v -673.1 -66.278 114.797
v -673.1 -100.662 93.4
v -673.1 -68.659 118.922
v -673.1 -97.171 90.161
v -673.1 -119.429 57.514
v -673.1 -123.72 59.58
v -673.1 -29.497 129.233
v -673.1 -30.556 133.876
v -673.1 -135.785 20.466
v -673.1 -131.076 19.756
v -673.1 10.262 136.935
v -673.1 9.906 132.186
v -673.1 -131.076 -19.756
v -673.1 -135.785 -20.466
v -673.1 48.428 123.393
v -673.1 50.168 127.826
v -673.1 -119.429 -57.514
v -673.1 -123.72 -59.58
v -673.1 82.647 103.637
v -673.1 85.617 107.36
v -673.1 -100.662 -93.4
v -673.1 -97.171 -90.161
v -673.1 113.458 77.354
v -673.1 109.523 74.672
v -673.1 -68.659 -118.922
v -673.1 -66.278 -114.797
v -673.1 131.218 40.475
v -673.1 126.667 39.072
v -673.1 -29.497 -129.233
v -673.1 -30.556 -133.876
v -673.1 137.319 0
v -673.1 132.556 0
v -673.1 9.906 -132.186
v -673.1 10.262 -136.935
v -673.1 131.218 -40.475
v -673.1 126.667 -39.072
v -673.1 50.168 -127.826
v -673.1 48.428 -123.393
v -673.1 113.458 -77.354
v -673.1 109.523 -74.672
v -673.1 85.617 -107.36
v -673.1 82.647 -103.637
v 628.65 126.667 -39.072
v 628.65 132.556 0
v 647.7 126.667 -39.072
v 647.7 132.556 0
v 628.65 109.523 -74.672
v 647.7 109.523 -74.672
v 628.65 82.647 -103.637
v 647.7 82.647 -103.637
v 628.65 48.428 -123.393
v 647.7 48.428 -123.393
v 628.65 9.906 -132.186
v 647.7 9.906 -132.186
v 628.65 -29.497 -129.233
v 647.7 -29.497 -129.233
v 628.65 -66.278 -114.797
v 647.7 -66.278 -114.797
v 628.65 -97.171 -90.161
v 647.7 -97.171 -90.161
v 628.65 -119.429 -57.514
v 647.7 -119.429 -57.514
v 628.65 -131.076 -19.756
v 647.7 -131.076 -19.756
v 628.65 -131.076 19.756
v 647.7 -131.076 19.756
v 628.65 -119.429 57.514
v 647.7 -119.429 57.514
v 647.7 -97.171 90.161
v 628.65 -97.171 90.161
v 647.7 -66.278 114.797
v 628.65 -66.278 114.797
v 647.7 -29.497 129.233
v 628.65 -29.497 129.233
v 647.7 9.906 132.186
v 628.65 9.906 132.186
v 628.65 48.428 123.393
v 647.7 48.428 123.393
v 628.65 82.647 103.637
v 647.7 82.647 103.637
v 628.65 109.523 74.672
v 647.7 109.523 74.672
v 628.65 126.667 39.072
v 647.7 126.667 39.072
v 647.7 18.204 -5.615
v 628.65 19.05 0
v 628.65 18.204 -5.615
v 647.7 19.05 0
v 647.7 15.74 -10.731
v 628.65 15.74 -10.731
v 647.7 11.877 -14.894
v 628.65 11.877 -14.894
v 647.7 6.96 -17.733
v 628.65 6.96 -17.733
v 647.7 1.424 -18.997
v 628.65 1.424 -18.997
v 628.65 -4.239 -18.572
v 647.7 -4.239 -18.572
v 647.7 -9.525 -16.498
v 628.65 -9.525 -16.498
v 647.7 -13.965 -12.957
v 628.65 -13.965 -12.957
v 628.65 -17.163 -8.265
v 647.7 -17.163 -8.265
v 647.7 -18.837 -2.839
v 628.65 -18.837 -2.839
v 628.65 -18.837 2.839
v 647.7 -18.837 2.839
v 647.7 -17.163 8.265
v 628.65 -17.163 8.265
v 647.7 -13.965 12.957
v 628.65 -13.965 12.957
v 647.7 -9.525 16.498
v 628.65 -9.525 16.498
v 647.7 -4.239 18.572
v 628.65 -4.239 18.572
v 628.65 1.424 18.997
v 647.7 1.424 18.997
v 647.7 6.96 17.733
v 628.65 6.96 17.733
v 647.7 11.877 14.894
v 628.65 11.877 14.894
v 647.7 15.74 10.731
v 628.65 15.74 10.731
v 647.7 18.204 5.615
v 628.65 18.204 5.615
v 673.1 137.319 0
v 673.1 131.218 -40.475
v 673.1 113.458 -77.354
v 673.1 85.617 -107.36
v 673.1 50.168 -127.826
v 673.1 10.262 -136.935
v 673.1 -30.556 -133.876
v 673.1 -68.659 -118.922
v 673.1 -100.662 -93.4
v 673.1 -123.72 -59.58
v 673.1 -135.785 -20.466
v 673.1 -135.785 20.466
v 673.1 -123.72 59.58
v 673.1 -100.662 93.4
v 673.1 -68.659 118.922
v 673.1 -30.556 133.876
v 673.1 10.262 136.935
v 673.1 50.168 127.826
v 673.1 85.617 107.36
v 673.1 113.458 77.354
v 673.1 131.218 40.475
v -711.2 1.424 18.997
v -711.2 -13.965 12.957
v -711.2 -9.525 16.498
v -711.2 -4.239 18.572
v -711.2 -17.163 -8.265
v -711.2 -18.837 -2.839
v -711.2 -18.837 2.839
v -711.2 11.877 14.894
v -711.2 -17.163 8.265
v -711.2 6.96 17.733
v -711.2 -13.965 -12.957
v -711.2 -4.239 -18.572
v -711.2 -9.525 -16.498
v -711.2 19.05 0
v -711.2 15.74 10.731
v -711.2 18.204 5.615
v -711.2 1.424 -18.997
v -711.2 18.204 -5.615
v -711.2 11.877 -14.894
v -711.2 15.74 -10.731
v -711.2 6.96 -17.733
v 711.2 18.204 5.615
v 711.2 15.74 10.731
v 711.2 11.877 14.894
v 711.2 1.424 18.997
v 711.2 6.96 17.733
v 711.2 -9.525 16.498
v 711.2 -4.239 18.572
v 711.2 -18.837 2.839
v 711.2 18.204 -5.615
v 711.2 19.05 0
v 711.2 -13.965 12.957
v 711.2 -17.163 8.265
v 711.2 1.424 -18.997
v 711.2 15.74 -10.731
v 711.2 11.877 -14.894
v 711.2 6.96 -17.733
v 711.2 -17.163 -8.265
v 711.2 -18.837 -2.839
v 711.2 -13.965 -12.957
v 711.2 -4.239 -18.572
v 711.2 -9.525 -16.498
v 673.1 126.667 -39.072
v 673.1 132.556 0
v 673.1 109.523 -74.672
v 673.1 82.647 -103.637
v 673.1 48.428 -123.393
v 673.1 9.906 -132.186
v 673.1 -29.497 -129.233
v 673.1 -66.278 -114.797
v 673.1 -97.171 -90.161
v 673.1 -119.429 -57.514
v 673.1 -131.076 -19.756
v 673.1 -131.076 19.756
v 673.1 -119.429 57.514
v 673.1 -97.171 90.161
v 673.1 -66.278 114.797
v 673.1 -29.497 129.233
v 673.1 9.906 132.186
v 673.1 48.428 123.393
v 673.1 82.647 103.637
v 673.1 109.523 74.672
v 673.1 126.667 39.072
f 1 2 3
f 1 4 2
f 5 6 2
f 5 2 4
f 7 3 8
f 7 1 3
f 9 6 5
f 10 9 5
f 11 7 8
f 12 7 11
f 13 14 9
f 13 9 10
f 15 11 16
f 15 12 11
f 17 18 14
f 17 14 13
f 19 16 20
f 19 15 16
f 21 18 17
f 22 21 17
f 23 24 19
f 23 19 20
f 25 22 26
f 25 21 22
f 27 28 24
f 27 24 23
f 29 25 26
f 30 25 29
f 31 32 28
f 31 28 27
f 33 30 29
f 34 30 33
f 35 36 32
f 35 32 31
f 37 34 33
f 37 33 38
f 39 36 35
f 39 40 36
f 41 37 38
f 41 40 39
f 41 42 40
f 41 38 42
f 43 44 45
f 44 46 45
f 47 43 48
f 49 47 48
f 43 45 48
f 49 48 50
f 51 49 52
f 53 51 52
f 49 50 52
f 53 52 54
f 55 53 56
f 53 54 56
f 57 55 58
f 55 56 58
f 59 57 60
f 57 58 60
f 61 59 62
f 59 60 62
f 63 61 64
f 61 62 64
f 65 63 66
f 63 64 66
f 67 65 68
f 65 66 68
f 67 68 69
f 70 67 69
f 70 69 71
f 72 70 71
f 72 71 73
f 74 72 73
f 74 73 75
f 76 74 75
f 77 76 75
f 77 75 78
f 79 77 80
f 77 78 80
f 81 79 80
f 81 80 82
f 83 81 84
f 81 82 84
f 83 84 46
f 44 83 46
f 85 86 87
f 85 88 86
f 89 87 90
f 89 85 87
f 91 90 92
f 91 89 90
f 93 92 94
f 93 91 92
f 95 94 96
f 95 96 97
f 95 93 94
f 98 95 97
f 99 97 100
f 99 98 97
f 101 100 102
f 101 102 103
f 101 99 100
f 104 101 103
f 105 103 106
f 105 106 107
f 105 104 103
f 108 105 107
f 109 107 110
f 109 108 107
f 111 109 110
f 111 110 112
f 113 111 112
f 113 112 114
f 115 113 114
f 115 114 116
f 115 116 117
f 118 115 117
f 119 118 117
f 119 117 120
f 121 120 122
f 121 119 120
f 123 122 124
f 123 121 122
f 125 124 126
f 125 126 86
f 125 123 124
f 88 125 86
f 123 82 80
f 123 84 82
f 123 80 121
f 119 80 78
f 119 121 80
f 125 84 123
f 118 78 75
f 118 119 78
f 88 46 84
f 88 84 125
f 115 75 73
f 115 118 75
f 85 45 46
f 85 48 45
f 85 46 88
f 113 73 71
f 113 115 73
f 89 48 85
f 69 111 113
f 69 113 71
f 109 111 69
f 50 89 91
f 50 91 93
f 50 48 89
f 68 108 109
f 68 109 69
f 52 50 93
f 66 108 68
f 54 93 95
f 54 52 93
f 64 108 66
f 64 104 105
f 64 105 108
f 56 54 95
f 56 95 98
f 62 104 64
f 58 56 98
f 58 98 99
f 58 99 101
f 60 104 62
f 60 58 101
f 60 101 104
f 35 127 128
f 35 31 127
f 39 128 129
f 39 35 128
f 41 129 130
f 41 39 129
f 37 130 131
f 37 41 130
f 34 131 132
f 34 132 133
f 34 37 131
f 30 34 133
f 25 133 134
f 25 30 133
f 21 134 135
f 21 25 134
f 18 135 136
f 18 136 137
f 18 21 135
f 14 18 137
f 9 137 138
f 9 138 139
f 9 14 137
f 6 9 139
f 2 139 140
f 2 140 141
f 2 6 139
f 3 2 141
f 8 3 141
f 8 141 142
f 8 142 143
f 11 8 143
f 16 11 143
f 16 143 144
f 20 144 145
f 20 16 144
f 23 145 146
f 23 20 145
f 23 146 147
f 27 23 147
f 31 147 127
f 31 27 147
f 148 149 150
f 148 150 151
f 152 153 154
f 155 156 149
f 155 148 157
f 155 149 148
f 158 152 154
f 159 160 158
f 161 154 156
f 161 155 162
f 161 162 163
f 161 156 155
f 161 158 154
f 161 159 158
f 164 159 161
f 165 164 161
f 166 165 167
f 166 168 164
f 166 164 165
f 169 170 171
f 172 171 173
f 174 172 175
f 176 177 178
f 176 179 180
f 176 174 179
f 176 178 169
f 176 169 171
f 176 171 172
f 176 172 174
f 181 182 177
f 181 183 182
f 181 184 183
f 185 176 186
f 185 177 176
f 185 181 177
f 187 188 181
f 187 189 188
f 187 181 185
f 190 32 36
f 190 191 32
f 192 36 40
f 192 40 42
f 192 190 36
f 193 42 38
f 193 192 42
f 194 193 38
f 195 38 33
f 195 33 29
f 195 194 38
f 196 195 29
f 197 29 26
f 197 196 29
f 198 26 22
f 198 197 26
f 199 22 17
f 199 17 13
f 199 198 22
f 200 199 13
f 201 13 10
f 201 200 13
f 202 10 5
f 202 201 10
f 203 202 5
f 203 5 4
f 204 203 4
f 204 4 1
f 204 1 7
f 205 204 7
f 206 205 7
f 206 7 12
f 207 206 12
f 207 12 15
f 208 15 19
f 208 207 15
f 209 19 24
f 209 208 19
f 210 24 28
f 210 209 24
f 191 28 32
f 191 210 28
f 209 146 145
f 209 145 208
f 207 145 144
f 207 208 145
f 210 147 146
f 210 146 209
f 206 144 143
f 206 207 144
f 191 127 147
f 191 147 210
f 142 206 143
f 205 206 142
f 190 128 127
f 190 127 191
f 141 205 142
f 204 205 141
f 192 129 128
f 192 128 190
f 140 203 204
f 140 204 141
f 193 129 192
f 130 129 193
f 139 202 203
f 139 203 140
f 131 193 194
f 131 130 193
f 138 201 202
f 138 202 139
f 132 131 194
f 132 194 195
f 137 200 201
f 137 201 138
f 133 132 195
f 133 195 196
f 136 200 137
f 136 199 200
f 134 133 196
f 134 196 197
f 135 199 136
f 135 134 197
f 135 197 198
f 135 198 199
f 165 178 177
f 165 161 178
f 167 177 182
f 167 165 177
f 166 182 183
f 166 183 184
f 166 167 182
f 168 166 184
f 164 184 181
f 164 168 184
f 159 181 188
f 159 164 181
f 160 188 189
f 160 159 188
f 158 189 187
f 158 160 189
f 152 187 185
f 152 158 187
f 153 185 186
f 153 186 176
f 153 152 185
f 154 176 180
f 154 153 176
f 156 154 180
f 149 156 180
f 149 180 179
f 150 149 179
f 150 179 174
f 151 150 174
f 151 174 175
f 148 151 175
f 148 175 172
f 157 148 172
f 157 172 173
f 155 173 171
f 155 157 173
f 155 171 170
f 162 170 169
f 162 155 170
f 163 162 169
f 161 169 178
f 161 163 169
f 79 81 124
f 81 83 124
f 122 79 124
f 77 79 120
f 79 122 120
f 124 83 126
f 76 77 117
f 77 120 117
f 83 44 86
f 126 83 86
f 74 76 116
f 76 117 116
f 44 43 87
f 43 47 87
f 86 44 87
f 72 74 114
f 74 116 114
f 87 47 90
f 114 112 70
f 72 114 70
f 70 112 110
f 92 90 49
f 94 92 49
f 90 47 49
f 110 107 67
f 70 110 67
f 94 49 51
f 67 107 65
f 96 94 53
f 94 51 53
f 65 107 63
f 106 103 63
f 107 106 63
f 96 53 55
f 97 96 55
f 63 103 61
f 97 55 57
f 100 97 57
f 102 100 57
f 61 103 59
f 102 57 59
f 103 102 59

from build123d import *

# Parameters (mm, degrees)
F0_W = 19.05
F0_H = 113.50625


with BuildPart() as f1:
    # F0 (on Top) → F1 (revolve)
    with BuildSketch(Plane.XY):
        Polygon((-711.2, 0), (0, 0), (0, 19.05), (-628.65, 19.05), (-647.7, 19.05), (-711.2, 19.05), align=None)
        Polygon((0, 19.05), (0, 0), (711.2, 0), (711.2, 19.05), (647.7, 19.05), (628.65, 19.05), align=None)
    revolve(axis=Axis((-355.6, 0, 0), (-1, 0, 0)))


with BuildPart() as f2:
    # F0 (on Top) → F2 (revolve)
    with BuildSketch(Plane.XY):
        with Locations((638.175, 75.803125)):
            Rectangle(F0_W, F0_H)
    revolve(axis=Axis((-355.6, 0, 0), (-1, 0, 0)))


with BuildPart() as f3:
    # F0 (on Top) → F3 (revolve)
    with BuildSketch(Plane.XY):
        Polygon((-647.7, 132.55625), (-628.65, 132.55625), (0, 132.55625), (0, 137.31875), (-673.1, 137.31875), (-673.1, 132.55625), align=None)
        Polygon((0, 132.55625), (628.65, 132.55625), (647.7, 132.55625), (673.1, 132.55625), (673.1, 137.31875), (0, 137.31875), align=None)
    revolve(axis=Axis((-355.6, 0, 0), (-1, 0, 0)))


solid = Compound([f1.part, f2.part, f3.part])
